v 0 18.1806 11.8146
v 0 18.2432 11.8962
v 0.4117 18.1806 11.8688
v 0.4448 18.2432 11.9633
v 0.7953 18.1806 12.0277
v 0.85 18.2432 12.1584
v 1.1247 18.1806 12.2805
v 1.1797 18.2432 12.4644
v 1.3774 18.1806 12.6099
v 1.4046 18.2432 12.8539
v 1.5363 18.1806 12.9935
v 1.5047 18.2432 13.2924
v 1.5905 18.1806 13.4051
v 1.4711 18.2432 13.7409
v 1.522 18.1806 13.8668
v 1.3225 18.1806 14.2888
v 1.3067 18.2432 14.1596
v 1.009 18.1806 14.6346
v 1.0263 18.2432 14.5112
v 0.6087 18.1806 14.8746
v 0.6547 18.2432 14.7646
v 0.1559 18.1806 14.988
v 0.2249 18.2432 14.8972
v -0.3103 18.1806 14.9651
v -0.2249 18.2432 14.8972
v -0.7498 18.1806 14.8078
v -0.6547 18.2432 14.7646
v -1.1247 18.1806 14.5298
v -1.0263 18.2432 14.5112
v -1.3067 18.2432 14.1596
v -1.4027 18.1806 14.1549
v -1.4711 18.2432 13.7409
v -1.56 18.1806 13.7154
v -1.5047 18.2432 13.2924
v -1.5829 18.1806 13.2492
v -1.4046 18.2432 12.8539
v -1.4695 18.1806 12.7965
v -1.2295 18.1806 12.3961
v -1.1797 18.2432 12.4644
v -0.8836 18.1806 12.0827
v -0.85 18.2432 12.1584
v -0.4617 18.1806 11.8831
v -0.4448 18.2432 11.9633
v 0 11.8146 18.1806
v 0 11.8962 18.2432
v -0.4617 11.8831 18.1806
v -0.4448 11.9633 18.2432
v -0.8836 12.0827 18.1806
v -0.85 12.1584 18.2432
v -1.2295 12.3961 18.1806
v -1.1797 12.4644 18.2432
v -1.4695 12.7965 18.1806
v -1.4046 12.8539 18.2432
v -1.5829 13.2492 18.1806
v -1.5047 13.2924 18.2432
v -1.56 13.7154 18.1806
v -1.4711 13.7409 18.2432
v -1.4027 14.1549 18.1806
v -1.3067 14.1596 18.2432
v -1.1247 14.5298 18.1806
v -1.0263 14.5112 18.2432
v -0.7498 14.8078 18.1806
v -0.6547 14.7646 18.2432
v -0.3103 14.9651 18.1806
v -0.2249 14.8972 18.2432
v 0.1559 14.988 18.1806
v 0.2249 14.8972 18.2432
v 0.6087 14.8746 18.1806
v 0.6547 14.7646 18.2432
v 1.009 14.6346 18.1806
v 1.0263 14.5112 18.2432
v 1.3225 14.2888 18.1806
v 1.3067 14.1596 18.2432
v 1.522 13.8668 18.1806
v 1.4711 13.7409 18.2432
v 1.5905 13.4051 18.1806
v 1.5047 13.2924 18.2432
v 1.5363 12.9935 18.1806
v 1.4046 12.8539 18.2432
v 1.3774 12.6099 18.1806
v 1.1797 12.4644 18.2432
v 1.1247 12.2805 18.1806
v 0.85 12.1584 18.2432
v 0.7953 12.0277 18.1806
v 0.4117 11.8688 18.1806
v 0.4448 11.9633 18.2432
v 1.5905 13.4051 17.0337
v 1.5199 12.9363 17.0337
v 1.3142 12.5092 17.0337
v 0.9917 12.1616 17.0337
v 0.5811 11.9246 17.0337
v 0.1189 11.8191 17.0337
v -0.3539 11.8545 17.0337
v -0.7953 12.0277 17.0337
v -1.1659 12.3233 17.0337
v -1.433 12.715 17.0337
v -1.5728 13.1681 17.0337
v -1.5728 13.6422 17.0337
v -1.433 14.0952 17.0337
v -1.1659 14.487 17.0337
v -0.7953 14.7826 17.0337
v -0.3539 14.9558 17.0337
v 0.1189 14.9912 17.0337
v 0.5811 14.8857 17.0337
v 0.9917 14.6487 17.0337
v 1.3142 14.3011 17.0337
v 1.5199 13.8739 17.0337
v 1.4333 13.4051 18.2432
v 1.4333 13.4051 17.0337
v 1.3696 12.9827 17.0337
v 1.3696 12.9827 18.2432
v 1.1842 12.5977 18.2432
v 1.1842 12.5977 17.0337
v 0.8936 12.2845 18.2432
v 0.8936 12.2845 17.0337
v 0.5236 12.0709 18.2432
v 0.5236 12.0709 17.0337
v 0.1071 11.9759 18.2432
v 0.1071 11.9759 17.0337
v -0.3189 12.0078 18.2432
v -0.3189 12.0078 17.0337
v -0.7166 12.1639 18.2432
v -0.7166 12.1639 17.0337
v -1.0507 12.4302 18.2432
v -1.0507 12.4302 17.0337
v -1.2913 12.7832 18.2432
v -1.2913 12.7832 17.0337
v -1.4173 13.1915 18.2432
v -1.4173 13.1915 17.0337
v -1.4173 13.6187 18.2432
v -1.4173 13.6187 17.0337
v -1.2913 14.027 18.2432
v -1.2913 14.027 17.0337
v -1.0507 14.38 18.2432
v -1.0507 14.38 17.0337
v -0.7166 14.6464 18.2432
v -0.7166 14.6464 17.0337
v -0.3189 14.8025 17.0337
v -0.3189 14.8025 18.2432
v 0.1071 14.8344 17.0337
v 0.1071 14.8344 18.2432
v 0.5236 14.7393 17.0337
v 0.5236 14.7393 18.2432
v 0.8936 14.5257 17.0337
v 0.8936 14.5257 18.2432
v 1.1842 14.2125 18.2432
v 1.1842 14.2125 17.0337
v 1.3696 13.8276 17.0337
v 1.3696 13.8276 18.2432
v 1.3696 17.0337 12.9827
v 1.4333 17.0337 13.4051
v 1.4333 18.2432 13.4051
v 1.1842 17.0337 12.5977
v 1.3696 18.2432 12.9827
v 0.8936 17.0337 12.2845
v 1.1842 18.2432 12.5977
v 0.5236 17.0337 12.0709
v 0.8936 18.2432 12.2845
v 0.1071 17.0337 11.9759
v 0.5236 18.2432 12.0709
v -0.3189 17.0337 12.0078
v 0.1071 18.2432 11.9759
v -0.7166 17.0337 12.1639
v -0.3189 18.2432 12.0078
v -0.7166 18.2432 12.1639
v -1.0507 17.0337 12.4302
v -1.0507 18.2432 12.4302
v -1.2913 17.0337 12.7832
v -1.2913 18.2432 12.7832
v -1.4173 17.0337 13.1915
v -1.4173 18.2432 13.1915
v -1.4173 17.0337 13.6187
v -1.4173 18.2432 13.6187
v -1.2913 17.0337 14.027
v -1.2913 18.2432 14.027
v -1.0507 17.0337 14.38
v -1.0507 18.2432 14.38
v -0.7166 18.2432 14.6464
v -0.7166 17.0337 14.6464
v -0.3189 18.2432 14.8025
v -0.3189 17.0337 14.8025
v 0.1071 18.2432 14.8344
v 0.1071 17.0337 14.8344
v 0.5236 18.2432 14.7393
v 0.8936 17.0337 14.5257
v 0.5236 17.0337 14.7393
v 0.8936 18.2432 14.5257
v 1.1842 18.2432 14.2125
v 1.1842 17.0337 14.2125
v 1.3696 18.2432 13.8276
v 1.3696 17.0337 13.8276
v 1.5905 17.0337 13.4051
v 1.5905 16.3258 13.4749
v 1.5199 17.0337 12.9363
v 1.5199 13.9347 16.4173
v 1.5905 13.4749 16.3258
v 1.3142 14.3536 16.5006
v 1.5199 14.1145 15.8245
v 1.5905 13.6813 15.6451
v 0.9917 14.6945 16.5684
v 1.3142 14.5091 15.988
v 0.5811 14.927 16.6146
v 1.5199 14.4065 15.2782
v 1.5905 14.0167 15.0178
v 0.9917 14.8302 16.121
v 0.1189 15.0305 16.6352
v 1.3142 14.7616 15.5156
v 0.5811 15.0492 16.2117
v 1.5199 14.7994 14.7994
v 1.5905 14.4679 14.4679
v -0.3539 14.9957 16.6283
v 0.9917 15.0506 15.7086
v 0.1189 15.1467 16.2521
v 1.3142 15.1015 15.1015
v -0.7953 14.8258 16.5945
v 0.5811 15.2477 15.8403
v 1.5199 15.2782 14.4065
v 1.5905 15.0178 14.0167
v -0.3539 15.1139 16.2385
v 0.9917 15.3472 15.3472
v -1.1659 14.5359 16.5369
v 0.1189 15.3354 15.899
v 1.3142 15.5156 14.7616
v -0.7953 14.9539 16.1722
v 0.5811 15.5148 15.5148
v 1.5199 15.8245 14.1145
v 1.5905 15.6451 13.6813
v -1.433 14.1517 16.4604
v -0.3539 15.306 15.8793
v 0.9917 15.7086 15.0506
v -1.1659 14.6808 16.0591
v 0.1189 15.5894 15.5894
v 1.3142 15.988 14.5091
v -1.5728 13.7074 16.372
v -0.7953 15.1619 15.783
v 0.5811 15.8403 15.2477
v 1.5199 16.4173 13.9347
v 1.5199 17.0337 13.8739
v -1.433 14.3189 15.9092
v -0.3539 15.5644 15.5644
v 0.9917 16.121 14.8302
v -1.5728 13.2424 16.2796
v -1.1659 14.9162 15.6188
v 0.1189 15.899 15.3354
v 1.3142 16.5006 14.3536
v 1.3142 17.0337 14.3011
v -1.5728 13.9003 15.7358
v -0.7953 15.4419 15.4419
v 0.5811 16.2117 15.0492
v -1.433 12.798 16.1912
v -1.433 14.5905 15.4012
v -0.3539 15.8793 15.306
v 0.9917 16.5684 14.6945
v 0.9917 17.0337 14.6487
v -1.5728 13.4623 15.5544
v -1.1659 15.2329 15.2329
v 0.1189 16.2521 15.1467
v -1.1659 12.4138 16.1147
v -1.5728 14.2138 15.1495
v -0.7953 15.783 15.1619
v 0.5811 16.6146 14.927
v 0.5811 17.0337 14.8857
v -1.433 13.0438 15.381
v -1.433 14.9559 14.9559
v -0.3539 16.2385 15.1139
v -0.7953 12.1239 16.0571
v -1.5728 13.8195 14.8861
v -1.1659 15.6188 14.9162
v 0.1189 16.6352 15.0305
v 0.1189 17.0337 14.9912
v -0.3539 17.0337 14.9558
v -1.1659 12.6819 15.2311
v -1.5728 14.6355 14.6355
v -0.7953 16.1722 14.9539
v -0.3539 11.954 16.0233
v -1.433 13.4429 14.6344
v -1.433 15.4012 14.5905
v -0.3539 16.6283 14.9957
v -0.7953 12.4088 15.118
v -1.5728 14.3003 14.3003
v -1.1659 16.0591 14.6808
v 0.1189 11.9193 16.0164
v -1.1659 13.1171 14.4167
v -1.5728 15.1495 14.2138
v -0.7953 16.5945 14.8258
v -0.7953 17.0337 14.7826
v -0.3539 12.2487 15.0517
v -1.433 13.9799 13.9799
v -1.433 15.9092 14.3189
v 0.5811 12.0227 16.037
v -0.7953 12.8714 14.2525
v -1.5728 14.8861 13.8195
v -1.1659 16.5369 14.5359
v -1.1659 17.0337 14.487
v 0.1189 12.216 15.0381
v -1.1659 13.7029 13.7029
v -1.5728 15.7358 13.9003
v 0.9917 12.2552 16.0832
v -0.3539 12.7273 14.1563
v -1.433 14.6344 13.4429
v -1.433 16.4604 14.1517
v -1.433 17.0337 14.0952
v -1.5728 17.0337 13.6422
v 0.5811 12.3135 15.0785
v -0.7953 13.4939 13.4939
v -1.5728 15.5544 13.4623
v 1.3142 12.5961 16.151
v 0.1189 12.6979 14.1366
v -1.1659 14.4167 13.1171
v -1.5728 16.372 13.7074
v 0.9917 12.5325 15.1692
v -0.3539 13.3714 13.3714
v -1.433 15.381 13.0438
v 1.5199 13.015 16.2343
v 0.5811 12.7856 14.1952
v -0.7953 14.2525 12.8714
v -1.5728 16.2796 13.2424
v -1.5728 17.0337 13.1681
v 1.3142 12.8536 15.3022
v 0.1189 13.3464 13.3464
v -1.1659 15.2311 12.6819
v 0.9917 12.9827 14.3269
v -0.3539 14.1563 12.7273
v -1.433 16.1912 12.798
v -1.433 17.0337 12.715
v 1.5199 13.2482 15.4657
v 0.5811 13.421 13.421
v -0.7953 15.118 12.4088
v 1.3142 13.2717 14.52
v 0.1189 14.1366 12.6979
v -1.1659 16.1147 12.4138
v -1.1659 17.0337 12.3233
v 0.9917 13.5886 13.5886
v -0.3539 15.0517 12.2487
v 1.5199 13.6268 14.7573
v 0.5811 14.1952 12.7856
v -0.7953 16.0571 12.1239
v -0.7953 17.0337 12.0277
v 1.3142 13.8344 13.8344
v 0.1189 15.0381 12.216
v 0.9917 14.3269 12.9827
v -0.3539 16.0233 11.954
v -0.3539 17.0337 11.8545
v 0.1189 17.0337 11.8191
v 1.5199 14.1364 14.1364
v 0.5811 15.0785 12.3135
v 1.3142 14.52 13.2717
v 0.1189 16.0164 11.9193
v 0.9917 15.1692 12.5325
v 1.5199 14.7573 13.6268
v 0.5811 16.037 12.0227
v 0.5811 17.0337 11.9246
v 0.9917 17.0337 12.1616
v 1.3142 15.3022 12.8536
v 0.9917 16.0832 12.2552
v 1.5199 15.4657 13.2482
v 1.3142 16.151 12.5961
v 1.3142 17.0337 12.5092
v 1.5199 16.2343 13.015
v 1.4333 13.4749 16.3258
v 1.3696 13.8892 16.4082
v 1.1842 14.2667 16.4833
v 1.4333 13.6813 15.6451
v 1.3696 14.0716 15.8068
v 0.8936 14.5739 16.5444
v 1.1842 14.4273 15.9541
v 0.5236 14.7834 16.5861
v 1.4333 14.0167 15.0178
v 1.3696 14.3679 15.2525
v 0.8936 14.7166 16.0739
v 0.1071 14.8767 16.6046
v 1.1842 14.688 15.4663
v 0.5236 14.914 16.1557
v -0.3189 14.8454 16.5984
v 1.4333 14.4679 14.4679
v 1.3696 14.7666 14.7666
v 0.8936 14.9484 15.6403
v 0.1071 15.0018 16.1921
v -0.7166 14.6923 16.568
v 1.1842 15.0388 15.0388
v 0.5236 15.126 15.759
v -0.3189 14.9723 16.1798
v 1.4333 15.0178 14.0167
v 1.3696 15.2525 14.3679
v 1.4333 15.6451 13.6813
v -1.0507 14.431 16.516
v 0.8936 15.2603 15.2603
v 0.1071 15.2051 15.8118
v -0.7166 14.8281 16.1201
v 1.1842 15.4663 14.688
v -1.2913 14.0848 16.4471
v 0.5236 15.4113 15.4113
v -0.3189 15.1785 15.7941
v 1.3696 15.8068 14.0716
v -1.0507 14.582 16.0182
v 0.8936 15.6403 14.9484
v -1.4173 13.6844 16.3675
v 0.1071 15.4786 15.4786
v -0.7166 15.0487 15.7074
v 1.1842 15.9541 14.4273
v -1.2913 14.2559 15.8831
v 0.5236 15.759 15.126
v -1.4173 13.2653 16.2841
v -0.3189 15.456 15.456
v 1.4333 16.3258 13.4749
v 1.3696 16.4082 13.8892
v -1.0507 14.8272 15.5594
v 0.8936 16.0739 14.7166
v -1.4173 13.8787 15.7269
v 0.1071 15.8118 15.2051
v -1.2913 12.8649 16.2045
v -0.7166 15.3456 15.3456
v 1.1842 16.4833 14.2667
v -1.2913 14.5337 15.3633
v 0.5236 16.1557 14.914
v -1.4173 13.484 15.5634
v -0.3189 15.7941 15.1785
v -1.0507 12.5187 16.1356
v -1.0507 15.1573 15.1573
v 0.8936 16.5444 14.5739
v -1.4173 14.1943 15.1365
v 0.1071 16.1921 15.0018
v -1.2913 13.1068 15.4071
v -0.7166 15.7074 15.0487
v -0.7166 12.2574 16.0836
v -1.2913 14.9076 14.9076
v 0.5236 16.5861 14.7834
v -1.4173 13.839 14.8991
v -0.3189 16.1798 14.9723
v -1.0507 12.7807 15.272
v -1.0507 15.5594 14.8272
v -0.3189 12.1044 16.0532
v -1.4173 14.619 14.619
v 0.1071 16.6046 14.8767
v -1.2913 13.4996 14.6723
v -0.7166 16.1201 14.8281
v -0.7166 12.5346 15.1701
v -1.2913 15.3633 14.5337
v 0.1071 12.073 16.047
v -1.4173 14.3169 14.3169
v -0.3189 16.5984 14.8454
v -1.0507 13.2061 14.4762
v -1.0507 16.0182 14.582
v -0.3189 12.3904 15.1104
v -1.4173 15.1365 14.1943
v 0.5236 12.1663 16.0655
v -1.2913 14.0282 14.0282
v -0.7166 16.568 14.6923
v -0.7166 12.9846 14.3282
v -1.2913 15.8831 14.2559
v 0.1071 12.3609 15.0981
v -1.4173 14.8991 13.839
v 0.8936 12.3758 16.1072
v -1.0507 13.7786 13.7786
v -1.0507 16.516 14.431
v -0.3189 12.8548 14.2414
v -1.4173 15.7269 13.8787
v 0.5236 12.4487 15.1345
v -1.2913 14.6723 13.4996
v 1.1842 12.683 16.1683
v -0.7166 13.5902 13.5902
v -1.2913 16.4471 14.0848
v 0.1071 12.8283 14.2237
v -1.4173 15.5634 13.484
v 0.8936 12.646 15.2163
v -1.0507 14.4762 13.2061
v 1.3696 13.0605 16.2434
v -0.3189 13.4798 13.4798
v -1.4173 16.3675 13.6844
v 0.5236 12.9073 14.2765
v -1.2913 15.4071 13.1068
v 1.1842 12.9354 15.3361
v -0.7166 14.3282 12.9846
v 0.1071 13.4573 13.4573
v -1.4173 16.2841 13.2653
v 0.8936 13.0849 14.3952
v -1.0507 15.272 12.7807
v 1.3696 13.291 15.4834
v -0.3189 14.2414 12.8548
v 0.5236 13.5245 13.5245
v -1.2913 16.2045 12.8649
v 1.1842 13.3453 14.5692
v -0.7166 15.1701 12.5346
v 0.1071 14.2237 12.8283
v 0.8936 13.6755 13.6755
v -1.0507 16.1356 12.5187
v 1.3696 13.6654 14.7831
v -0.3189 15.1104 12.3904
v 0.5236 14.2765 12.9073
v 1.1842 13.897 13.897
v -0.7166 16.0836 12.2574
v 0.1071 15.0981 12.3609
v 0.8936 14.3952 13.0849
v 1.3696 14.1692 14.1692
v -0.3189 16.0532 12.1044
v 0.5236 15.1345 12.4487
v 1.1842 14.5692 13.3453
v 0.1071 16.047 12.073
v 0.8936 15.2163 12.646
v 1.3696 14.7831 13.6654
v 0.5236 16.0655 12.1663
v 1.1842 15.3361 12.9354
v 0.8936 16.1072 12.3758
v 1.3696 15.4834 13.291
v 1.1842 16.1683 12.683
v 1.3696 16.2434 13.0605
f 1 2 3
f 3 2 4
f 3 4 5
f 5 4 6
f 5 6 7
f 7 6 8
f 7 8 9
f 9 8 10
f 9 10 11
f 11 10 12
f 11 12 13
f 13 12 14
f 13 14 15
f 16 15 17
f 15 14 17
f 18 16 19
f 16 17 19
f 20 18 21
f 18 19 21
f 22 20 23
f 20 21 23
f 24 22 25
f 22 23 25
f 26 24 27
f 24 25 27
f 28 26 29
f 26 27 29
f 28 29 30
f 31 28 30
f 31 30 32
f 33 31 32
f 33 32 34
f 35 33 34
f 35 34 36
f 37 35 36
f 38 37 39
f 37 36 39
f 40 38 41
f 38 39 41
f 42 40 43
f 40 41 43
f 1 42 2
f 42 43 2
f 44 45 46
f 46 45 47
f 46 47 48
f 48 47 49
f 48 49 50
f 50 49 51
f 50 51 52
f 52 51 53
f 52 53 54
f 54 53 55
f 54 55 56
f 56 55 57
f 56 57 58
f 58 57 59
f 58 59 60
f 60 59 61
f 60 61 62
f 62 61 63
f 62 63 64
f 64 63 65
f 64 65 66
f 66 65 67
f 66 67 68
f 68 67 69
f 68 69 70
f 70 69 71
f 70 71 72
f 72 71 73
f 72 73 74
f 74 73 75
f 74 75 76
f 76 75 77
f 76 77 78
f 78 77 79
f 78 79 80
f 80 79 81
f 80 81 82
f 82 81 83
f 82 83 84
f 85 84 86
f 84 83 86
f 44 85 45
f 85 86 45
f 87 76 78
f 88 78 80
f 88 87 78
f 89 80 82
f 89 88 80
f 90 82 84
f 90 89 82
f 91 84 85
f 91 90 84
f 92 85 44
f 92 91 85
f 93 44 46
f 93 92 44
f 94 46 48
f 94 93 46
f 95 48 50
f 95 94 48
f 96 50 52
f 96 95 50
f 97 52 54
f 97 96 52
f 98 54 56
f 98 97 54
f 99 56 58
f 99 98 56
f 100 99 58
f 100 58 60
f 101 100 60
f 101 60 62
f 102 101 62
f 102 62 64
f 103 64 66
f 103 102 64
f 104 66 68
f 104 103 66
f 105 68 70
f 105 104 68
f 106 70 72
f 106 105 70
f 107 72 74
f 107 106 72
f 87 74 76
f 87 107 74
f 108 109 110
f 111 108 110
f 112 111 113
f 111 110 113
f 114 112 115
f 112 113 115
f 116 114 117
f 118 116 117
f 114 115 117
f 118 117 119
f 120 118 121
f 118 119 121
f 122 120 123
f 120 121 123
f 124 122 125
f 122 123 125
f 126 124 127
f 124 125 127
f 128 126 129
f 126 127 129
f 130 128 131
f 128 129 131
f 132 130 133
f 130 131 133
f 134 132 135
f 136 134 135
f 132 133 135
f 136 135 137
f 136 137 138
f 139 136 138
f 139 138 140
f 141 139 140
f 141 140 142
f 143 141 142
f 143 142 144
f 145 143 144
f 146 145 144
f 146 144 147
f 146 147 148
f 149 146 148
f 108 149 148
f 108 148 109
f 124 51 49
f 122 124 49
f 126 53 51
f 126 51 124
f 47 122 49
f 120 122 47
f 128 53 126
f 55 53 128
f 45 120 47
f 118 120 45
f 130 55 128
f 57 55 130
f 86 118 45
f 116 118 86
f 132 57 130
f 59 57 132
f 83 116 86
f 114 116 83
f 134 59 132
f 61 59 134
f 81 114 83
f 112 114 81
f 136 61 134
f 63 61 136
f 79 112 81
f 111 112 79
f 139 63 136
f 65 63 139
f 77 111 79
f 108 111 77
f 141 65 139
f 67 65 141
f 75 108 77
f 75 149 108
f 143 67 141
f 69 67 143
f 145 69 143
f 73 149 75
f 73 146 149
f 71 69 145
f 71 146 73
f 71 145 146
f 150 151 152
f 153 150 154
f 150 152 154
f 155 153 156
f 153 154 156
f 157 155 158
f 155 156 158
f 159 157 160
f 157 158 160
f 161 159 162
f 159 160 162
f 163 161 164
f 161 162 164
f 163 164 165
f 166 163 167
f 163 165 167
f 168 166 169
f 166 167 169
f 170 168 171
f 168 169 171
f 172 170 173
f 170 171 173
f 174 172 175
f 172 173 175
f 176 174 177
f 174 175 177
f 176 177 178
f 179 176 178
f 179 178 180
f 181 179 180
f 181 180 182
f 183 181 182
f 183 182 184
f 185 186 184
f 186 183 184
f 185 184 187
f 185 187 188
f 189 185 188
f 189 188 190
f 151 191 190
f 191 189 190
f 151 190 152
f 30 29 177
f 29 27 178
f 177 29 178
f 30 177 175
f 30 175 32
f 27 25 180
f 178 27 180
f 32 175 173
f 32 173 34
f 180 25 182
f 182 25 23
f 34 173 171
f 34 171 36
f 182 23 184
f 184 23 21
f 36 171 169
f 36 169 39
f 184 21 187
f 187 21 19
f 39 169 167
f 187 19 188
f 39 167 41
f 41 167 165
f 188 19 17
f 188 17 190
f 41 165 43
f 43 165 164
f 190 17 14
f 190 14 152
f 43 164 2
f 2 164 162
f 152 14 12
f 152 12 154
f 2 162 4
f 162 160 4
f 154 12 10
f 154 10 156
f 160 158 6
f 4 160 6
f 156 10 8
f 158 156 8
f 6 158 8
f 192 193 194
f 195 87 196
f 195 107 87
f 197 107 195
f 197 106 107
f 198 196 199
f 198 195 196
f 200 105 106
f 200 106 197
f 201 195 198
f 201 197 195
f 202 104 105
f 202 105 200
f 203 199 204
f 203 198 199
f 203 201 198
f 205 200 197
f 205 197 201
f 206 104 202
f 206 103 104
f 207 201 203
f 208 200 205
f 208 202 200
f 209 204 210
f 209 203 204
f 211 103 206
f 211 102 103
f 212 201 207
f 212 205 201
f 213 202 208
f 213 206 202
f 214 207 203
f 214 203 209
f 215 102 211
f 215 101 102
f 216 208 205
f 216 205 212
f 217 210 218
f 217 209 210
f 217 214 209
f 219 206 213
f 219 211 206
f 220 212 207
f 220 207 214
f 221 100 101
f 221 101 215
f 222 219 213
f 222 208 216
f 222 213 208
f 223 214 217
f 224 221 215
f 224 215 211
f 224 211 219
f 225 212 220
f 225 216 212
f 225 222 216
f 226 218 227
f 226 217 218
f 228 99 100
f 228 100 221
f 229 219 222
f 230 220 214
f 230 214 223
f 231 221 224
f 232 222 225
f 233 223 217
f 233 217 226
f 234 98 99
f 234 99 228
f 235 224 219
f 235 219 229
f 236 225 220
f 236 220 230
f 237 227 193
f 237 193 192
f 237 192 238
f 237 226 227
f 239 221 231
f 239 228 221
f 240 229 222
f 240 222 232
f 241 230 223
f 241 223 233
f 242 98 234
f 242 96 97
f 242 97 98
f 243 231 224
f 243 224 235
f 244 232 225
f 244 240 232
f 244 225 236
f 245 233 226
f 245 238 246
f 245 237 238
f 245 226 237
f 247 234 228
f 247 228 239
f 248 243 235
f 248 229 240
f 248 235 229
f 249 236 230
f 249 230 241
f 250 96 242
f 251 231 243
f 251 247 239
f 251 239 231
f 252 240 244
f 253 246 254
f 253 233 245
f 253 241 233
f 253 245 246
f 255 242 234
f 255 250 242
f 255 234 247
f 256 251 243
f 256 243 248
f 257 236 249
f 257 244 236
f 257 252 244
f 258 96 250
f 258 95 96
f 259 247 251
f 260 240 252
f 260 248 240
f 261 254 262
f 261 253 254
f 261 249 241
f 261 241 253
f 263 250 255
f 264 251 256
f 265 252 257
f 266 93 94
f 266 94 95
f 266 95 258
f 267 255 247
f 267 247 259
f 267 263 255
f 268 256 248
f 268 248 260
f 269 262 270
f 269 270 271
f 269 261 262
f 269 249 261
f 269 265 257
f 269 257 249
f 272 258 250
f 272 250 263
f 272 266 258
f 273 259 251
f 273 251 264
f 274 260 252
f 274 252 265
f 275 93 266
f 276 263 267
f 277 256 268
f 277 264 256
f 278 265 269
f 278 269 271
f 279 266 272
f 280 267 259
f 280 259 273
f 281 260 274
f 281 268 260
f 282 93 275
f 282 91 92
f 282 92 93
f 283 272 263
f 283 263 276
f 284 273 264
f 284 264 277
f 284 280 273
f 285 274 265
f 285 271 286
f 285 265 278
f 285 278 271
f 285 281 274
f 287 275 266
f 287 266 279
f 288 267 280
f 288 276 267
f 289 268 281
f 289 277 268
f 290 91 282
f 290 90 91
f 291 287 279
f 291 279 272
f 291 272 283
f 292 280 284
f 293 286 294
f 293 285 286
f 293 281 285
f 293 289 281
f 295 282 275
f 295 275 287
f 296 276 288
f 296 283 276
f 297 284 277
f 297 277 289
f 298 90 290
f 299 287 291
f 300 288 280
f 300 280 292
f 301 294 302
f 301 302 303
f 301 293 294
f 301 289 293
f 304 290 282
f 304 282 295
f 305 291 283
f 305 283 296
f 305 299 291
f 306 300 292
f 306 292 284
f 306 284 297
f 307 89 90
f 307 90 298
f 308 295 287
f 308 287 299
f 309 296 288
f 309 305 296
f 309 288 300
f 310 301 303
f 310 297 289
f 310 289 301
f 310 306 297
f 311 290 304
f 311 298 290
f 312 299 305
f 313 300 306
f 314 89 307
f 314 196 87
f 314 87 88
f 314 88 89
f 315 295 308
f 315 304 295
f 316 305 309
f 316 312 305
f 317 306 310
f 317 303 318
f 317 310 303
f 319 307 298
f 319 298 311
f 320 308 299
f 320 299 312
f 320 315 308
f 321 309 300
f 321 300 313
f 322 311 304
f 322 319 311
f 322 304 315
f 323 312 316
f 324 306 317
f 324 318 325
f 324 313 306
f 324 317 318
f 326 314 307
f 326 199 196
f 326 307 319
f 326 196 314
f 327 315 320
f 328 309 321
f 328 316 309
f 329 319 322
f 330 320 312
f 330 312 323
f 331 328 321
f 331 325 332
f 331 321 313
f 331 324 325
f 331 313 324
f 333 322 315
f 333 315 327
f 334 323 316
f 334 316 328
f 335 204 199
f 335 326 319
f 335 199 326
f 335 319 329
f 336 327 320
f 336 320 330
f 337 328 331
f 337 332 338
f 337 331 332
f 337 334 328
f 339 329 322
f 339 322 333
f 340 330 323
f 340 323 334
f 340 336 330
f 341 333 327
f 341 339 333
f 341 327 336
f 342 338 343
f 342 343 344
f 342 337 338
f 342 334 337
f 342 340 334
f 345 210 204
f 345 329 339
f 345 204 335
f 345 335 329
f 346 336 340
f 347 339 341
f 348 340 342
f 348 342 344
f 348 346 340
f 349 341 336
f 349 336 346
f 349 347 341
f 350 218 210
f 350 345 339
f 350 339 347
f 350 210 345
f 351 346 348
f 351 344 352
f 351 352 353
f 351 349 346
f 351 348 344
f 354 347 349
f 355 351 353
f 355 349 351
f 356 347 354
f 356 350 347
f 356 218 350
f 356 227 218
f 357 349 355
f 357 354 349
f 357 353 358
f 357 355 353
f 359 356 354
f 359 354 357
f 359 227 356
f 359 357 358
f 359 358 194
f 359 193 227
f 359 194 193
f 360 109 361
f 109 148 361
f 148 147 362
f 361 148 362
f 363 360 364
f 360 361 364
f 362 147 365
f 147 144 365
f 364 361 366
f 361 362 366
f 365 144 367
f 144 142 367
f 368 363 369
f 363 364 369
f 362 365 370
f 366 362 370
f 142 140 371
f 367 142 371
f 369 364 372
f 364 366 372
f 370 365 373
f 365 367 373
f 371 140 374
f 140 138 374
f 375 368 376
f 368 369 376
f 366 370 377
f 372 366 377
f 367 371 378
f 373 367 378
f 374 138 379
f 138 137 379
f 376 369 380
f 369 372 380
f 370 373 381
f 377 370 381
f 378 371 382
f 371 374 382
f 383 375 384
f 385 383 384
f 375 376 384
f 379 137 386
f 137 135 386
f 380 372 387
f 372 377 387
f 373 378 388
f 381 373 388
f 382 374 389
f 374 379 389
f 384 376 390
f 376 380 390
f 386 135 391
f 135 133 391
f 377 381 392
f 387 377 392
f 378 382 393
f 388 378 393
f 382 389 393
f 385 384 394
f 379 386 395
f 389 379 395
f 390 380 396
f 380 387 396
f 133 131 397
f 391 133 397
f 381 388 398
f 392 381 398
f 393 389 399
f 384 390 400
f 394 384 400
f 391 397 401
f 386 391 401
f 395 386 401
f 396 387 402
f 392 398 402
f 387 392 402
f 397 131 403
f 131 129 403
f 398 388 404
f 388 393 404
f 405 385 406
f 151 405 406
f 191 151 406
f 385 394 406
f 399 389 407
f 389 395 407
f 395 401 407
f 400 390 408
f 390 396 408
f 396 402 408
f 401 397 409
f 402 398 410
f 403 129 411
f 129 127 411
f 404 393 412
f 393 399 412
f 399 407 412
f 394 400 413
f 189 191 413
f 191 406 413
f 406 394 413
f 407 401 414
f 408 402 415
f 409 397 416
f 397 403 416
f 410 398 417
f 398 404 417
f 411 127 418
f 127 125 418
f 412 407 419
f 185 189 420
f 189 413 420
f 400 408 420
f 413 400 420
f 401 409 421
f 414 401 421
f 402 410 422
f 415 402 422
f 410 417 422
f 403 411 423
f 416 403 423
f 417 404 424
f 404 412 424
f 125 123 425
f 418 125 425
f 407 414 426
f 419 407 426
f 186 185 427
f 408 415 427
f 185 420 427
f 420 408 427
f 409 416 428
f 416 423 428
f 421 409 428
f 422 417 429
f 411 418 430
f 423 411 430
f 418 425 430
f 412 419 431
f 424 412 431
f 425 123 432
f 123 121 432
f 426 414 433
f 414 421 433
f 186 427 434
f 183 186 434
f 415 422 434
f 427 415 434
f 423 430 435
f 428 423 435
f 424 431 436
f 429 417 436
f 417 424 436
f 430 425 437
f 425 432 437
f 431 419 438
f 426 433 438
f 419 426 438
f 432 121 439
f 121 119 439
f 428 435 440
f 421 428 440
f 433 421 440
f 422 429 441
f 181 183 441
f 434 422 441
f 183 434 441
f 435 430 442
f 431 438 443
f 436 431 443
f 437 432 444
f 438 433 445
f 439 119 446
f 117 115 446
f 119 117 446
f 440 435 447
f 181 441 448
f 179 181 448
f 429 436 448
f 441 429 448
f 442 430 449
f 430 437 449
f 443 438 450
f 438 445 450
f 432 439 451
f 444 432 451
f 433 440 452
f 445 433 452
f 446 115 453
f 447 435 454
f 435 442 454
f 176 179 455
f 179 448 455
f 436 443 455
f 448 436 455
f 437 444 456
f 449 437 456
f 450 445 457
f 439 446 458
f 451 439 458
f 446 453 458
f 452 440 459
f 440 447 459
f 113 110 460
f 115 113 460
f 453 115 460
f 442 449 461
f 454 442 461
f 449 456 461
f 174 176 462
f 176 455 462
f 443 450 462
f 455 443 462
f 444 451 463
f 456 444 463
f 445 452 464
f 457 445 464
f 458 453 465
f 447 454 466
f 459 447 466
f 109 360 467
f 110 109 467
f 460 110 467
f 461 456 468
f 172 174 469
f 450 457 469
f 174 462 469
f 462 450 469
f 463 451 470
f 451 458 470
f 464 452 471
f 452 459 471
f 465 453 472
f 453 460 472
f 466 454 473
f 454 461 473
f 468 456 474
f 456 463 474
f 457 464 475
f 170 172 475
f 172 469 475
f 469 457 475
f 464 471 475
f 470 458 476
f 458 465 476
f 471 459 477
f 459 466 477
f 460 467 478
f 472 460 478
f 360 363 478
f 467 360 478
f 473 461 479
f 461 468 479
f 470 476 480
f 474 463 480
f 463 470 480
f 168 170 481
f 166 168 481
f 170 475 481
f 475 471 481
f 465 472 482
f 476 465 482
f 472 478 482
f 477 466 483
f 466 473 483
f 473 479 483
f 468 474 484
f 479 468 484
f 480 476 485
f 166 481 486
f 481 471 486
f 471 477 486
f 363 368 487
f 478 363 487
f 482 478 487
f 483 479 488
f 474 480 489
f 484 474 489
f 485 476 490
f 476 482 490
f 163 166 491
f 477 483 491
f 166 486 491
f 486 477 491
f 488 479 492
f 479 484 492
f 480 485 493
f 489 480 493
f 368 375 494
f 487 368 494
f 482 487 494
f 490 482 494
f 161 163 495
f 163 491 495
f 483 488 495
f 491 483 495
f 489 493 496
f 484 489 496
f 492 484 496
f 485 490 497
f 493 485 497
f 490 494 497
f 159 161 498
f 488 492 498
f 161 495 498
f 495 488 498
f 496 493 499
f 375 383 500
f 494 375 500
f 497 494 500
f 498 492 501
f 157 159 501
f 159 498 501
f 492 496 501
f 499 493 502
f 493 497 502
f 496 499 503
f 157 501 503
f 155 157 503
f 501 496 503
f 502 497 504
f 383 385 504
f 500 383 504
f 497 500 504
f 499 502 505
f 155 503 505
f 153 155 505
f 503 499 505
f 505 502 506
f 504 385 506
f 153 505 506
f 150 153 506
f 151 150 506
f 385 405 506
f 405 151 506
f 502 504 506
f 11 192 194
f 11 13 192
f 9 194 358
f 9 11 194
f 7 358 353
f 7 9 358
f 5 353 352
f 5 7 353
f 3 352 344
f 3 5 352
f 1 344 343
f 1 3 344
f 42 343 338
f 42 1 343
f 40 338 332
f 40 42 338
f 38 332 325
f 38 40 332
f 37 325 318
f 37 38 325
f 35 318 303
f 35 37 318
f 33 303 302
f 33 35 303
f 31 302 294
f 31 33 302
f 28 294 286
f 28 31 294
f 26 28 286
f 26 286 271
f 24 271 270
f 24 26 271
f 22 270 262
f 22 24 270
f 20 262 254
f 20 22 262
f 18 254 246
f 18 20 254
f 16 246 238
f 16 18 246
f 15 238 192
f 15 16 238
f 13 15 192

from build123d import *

# Parameters (mm, degrees)
SKETCH2_R    = 16.7005
SKETCH2_R_2  = 15.0495
SCALE1_SCALE = 0.095238095


with BuildPart() as part:
    # Sweep1: sweep along a path in Sketch1
    with BuildLine(Plane(origin=(0, 0, 0), x_dir=(0, 0, -1), z_dir=(1, 0, 0))) as sweep1_path:
        Line((-50.8, 0), (-38.1, 0))
        ThreePointArc((-38.1, 0), (-11.159231637, 11.159231637), (0, 38.1))
        Line((0, 38.1), (0, 50.8))
    # Sketch2 → Sweep1 (sweep)
    with BuildSketch(Plane.XY.offset(50.8)):
        Circle(SKETCH2_R)
        Circle(SKETCH2_R_2, mode=Mode.SUBTRACT)
    sweep(path=sweep1_path.line)

    # Sketch3 → Cut-Revolve1 (revolve, cut)
    with BuildSketch(Plane(origin=(0, 0, 0), x_dir=(0, 1, 0), z_dir=(-1, 0, 0))):
        Polygon((-16.7005, -50.8), (-16.7005, -50.14220894), (-15.84325, -50.8), align=None)
    revolve(axis=Axis((0, 0, 50.8), (0, 0, -1)), mode=Mode.SUBTRACT)

    # Sketch3<4> → Cut-Revolve2 (revolve, cut)
    with BuildSketch(Plane(origin=(0, 0, 0), x_dir=(0, 1, 0), z_dir=(-1, 0, 0))):
        Polygon((50.8, 15.84325), (50.8, 16.7005), (50.14220894, 16.7005), align=None)
    revolve(axis=Axis((0, 50.8, 0), (0, -1, 0)), mode=Mode.SUBTRACT)


with BuildPart() as part_1:
    # Scale1: scaled about (0, 14.816195429, 14.816195429)
    add(part.part.scale(SCALE1_SCALE).moved(Location((0, 13.405129198, 13.405129198))))


solid = part_1.part
